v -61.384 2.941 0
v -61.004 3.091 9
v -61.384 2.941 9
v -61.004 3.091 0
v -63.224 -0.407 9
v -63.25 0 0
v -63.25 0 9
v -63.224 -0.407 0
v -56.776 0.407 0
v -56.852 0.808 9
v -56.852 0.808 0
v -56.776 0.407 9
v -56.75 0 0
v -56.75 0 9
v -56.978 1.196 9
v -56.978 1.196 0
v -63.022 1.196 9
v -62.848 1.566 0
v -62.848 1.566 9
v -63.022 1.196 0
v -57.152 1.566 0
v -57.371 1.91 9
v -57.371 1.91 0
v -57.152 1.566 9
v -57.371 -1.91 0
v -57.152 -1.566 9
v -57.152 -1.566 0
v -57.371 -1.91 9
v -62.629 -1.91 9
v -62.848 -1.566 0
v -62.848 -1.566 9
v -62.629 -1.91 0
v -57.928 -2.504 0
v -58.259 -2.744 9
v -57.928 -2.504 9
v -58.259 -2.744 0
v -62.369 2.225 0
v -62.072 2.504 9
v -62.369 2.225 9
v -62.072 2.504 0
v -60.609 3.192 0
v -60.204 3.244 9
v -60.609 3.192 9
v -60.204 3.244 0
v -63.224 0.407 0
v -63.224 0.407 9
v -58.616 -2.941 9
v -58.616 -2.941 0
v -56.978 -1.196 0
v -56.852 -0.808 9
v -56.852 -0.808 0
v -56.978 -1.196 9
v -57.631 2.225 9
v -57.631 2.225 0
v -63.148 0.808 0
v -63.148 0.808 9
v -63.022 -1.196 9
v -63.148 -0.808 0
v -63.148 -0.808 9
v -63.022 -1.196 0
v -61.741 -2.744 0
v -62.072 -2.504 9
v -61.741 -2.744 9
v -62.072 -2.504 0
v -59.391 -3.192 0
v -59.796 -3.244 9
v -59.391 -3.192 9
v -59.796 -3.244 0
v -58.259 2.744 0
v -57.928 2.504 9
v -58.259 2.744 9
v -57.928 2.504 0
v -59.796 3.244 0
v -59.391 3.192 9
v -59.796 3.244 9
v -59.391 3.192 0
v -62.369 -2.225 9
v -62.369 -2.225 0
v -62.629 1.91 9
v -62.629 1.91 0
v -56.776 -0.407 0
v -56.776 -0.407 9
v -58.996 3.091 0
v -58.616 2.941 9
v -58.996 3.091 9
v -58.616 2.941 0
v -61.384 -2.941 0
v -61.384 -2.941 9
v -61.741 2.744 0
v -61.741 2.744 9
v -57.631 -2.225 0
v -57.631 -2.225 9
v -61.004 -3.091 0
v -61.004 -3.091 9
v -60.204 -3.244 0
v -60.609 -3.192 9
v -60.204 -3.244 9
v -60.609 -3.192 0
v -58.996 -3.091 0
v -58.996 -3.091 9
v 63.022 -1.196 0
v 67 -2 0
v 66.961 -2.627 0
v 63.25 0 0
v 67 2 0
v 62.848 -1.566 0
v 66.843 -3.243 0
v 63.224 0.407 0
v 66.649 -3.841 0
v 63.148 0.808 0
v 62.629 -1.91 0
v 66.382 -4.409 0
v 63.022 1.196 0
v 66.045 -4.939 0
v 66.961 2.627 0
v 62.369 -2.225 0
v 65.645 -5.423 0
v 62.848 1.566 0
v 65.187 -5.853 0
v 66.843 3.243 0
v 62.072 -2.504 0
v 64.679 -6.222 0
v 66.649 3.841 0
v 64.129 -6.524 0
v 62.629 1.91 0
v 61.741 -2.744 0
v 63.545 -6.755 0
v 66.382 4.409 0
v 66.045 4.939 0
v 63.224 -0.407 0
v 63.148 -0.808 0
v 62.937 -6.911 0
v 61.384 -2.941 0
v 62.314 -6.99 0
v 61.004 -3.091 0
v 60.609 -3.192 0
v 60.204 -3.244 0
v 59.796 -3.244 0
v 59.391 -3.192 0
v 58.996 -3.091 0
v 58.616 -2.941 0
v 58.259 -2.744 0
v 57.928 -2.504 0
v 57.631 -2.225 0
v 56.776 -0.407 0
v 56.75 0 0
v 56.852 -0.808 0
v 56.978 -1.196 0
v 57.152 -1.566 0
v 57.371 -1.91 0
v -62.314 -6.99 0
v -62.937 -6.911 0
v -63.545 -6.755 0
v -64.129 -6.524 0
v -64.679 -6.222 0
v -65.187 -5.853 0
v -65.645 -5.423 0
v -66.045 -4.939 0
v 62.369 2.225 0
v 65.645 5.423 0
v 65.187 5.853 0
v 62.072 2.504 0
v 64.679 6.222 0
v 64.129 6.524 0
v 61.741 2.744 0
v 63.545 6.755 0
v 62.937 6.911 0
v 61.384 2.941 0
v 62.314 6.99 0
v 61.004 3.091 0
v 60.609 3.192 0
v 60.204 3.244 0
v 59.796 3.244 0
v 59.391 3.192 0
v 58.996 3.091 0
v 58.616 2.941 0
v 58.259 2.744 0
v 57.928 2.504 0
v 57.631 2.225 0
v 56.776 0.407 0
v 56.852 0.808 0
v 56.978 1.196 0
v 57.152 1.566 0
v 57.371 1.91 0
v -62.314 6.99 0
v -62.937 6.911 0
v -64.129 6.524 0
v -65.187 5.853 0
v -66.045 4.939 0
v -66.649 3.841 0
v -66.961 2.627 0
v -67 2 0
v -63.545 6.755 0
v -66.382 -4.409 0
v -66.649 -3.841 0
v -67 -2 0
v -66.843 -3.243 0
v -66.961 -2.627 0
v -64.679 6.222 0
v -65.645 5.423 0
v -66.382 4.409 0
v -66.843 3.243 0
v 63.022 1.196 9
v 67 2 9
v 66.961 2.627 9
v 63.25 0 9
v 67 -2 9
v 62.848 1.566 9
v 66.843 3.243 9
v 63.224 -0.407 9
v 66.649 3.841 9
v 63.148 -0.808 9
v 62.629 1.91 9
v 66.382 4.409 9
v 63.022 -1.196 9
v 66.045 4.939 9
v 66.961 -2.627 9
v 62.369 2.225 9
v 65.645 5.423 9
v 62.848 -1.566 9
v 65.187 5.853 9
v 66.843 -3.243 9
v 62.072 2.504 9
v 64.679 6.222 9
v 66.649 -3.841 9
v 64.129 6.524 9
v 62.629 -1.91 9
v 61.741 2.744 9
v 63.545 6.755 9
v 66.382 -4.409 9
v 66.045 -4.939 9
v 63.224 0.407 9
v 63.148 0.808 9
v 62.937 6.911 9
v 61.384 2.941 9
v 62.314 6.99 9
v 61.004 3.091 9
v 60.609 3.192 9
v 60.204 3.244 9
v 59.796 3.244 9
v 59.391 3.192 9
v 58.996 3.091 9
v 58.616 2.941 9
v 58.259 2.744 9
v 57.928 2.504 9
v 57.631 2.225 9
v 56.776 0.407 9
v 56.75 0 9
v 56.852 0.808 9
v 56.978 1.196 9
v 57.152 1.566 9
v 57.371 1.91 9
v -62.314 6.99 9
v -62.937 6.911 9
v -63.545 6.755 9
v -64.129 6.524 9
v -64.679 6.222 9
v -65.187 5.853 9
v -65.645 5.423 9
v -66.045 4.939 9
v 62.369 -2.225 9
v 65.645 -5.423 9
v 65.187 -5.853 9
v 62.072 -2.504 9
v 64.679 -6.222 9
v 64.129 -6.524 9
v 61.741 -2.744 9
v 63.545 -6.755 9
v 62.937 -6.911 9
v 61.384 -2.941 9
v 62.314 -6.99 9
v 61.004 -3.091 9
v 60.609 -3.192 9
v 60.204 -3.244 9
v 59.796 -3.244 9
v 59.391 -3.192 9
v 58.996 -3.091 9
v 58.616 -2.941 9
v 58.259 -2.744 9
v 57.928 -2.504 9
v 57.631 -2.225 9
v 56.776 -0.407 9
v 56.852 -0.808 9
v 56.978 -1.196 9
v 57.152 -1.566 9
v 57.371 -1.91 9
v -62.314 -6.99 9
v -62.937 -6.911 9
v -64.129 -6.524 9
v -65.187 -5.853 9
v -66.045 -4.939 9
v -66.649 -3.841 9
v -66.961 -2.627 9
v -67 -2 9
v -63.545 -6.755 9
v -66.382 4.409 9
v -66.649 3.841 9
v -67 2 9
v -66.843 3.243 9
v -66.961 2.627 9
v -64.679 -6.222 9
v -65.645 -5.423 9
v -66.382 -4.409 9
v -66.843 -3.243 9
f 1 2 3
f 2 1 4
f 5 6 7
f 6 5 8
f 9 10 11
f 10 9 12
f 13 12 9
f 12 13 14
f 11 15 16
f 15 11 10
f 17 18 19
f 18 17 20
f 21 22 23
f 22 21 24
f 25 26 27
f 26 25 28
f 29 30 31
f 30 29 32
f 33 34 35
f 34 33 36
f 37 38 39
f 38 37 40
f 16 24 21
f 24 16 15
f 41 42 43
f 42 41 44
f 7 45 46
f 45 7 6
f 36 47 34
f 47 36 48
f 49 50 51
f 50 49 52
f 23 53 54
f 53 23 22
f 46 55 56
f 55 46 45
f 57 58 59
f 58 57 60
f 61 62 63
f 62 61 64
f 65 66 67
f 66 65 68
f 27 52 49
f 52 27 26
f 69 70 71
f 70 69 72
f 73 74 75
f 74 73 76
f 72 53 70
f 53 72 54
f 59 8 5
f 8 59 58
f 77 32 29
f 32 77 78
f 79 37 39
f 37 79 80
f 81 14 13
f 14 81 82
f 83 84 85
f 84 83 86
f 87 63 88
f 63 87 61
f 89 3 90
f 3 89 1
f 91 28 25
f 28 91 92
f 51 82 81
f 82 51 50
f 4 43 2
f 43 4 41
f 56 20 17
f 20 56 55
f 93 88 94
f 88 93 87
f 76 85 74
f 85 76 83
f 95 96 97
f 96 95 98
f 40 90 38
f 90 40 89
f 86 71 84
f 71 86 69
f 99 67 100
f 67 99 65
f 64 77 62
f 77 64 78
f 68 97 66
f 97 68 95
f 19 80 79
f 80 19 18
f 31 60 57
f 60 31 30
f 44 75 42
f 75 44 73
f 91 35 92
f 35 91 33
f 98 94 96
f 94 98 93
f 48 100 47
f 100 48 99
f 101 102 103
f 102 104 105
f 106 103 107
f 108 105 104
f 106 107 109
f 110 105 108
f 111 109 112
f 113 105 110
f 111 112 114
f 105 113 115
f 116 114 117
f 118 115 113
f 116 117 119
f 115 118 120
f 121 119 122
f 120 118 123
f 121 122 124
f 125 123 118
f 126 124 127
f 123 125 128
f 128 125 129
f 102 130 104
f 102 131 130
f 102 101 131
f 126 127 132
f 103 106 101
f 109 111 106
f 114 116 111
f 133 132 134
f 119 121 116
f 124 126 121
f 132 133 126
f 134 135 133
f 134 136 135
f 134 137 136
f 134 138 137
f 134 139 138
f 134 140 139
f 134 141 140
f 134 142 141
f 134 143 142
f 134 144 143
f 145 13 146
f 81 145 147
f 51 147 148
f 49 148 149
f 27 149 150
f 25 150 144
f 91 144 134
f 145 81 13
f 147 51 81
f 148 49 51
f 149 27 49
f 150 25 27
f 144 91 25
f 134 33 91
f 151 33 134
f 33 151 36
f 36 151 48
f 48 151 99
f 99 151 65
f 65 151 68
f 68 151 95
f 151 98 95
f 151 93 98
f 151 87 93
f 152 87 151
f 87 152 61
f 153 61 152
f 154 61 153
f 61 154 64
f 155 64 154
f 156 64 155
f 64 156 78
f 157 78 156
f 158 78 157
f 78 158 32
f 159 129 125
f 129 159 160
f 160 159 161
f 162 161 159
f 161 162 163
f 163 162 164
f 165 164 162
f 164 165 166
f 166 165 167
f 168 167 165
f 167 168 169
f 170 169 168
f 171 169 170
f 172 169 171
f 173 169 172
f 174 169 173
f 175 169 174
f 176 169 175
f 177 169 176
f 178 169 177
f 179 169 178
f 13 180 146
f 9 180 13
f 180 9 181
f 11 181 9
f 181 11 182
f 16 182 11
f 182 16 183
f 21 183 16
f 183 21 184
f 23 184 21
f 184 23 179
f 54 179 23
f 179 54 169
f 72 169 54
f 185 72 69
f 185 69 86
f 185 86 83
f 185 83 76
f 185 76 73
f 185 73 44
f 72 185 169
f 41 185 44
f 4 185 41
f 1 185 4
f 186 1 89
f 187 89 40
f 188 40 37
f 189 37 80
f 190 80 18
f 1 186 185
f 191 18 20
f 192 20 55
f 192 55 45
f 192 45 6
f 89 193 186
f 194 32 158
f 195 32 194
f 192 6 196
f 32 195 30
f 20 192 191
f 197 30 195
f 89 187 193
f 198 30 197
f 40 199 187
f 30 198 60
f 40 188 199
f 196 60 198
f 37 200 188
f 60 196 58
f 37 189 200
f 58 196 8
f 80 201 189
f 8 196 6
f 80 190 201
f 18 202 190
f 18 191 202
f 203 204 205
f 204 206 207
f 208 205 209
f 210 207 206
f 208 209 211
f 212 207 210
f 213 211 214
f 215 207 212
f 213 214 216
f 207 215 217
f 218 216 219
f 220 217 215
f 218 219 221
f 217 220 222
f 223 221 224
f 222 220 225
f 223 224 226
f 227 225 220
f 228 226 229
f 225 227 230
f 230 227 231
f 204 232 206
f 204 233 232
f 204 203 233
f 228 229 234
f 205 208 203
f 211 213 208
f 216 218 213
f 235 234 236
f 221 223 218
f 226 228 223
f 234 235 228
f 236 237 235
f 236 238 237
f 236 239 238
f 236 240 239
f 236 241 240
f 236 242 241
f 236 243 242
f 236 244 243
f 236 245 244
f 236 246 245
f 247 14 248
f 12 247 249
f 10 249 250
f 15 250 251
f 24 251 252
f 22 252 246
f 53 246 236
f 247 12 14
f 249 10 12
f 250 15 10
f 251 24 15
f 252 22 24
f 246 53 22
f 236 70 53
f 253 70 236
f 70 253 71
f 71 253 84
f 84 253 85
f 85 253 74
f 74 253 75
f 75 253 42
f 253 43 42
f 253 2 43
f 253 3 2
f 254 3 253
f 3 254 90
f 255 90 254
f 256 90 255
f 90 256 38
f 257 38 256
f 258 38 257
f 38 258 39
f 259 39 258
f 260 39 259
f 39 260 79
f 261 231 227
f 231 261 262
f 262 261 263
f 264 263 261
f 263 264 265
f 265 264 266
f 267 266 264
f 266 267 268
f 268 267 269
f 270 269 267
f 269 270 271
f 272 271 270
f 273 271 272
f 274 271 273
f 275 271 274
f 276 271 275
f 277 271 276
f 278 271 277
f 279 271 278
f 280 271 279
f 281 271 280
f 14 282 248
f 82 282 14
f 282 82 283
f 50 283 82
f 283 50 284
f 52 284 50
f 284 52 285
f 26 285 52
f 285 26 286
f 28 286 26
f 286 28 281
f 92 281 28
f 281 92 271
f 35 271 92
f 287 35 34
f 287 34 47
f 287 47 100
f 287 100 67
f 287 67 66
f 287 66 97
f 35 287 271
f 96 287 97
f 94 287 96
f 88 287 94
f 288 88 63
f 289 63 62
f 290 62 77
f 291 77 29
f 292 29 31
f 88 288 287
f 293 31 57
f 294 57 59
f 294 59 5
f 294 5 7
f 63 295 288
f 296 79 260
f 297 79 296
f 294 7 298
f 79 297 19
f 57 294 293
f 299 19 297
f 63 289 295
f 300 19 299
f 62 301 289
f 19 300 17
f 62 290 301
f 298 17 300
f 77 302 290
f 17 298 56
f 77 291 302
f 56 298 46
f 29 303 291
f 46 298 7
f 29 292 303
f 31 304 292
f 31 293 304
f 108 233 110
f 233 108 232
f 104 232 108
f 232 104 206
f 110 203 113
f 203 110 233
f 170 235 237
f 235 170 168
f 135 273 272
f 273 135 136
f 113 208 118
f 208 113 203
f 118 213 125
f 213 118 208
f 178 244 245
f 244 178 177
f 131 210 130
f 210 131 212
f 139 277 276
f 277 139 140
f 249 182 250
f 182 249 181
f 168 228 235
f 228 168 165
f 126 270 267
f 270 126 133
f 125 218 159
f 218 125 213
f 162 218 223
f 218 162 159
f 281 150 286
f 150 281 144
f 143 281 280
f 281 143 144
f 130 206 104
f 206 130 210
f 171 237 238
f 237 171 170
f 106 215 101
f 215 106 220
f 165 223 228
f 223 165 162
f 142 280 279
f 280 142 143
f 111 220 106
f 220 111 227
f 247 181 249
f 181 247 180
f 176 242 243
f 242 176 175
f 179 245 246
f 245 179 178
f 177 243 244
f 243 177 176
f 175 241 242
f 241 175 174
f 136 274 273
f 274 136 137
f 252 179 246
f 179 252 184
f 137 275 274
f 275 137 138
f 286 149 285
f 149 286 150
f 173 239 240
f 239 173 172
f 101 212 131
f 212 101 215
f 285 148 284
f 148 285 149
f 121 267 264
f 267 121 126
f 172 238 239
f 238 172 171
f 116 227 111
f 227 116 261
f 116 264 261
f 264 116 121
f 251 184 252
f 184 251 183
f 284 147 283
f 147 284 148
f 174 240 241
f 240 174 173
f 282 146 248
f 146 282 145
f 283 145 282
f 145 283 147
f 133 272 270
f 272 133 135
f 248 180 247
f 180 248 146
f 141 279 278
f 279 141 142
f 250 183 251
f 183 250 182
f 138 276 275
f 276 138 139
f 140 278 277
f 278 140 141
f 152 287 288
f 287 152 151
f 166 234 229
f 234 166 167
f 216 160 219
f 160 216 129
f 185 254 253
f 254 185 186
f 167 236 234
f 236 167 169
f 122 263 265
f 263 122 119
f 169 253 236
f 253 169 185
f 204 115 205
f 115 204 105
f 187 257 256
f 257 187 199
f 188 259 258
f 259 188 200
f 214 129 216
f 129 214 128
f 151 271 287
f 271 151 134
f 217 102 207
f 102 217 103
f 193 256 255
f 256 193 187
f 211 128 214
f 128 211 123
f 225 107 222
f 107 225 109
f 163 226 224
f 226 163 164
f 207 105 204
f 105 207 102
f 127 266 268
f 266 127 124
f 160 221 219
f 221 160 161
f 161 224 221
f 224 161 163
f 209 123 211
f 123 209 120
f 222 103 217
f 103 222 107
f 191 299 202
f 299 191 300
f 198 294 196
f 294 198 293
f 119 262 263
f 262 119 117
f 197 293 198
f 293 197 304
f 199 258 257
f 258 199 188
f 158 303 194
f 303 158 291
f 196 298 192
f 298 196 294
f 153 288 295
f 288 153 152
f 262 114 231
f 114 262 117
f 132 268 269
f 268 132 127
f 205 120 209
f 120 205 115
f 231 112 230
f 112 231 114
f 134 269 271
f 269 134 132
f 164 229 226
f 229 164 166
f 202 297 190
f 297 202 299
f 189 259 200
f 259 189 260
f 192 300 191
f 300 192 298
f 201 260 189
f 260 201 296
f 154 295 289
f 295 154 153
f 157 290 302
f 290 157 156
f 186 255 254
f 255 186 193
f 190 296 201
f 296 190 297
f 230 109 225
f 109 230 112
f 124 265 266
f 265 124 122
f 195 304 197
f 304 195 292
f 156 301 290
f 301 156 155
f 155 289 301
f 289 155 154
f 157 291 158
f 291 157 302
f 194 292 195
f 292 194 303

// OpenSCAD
$fn = 50;


difference() {
	union() {
		hull() {
			translate(v = [-62.0000000000, 2.0000000000, 0]) {
				cylinder(h = 9, r = 5);
			}
			translate(v = [62.0000000000, 2.0000000000, 0]) {
				cylinder(h = 9, r = 5);
			}
			translate(v = [-62.0000000000, -2.0000000000, 0]) {
				cylinder(h = 9, r = 5);
			}
			translate(v = [62.0000000000, -2.0000000000, 0]) {
				cylinder(h = 9, r = 5);
			}
		}
	}
	union() {
		translate(v = [-60.0000000000, 0.0000000000, 0]) {
			cylinder(h = 9, r = 3.2500000000);
		}
		translate(v = [60.0000000000, 0.0000000000, 0]) {
			cylinder(h = 9, r = 3.2500000000);
		}
		translate(v = [-60.0000000000, 0.0000000000, 0]) {
			cylinder(h = 9, r = 1.8000000000);
		}
		translate(v = [60.0000000000, 0.0000000000, 0]) {
			cylinder(h = 9, r = 1.8000000000);
		}
		translate(v = [-60.0000000000, 0.0000000000, 0]) {
			cylinder(h = 9, r = 1.8000000000);
		}
		translate(v = [60.0000000000, 0.0000000000, 0]) {
			cylinder(h = 9, r = 1.8000000000);
		}
		translate(v = [-60.0000000000, 0.0000000000, 0]) {
			cylinder(h = 9, r = 1.8000000000);
		}
		translate(v = [60.0000000000, 0.0000000000, 0]) {
			cylinder(h = 9, r = 1.8000000000);
		}
	}
}
